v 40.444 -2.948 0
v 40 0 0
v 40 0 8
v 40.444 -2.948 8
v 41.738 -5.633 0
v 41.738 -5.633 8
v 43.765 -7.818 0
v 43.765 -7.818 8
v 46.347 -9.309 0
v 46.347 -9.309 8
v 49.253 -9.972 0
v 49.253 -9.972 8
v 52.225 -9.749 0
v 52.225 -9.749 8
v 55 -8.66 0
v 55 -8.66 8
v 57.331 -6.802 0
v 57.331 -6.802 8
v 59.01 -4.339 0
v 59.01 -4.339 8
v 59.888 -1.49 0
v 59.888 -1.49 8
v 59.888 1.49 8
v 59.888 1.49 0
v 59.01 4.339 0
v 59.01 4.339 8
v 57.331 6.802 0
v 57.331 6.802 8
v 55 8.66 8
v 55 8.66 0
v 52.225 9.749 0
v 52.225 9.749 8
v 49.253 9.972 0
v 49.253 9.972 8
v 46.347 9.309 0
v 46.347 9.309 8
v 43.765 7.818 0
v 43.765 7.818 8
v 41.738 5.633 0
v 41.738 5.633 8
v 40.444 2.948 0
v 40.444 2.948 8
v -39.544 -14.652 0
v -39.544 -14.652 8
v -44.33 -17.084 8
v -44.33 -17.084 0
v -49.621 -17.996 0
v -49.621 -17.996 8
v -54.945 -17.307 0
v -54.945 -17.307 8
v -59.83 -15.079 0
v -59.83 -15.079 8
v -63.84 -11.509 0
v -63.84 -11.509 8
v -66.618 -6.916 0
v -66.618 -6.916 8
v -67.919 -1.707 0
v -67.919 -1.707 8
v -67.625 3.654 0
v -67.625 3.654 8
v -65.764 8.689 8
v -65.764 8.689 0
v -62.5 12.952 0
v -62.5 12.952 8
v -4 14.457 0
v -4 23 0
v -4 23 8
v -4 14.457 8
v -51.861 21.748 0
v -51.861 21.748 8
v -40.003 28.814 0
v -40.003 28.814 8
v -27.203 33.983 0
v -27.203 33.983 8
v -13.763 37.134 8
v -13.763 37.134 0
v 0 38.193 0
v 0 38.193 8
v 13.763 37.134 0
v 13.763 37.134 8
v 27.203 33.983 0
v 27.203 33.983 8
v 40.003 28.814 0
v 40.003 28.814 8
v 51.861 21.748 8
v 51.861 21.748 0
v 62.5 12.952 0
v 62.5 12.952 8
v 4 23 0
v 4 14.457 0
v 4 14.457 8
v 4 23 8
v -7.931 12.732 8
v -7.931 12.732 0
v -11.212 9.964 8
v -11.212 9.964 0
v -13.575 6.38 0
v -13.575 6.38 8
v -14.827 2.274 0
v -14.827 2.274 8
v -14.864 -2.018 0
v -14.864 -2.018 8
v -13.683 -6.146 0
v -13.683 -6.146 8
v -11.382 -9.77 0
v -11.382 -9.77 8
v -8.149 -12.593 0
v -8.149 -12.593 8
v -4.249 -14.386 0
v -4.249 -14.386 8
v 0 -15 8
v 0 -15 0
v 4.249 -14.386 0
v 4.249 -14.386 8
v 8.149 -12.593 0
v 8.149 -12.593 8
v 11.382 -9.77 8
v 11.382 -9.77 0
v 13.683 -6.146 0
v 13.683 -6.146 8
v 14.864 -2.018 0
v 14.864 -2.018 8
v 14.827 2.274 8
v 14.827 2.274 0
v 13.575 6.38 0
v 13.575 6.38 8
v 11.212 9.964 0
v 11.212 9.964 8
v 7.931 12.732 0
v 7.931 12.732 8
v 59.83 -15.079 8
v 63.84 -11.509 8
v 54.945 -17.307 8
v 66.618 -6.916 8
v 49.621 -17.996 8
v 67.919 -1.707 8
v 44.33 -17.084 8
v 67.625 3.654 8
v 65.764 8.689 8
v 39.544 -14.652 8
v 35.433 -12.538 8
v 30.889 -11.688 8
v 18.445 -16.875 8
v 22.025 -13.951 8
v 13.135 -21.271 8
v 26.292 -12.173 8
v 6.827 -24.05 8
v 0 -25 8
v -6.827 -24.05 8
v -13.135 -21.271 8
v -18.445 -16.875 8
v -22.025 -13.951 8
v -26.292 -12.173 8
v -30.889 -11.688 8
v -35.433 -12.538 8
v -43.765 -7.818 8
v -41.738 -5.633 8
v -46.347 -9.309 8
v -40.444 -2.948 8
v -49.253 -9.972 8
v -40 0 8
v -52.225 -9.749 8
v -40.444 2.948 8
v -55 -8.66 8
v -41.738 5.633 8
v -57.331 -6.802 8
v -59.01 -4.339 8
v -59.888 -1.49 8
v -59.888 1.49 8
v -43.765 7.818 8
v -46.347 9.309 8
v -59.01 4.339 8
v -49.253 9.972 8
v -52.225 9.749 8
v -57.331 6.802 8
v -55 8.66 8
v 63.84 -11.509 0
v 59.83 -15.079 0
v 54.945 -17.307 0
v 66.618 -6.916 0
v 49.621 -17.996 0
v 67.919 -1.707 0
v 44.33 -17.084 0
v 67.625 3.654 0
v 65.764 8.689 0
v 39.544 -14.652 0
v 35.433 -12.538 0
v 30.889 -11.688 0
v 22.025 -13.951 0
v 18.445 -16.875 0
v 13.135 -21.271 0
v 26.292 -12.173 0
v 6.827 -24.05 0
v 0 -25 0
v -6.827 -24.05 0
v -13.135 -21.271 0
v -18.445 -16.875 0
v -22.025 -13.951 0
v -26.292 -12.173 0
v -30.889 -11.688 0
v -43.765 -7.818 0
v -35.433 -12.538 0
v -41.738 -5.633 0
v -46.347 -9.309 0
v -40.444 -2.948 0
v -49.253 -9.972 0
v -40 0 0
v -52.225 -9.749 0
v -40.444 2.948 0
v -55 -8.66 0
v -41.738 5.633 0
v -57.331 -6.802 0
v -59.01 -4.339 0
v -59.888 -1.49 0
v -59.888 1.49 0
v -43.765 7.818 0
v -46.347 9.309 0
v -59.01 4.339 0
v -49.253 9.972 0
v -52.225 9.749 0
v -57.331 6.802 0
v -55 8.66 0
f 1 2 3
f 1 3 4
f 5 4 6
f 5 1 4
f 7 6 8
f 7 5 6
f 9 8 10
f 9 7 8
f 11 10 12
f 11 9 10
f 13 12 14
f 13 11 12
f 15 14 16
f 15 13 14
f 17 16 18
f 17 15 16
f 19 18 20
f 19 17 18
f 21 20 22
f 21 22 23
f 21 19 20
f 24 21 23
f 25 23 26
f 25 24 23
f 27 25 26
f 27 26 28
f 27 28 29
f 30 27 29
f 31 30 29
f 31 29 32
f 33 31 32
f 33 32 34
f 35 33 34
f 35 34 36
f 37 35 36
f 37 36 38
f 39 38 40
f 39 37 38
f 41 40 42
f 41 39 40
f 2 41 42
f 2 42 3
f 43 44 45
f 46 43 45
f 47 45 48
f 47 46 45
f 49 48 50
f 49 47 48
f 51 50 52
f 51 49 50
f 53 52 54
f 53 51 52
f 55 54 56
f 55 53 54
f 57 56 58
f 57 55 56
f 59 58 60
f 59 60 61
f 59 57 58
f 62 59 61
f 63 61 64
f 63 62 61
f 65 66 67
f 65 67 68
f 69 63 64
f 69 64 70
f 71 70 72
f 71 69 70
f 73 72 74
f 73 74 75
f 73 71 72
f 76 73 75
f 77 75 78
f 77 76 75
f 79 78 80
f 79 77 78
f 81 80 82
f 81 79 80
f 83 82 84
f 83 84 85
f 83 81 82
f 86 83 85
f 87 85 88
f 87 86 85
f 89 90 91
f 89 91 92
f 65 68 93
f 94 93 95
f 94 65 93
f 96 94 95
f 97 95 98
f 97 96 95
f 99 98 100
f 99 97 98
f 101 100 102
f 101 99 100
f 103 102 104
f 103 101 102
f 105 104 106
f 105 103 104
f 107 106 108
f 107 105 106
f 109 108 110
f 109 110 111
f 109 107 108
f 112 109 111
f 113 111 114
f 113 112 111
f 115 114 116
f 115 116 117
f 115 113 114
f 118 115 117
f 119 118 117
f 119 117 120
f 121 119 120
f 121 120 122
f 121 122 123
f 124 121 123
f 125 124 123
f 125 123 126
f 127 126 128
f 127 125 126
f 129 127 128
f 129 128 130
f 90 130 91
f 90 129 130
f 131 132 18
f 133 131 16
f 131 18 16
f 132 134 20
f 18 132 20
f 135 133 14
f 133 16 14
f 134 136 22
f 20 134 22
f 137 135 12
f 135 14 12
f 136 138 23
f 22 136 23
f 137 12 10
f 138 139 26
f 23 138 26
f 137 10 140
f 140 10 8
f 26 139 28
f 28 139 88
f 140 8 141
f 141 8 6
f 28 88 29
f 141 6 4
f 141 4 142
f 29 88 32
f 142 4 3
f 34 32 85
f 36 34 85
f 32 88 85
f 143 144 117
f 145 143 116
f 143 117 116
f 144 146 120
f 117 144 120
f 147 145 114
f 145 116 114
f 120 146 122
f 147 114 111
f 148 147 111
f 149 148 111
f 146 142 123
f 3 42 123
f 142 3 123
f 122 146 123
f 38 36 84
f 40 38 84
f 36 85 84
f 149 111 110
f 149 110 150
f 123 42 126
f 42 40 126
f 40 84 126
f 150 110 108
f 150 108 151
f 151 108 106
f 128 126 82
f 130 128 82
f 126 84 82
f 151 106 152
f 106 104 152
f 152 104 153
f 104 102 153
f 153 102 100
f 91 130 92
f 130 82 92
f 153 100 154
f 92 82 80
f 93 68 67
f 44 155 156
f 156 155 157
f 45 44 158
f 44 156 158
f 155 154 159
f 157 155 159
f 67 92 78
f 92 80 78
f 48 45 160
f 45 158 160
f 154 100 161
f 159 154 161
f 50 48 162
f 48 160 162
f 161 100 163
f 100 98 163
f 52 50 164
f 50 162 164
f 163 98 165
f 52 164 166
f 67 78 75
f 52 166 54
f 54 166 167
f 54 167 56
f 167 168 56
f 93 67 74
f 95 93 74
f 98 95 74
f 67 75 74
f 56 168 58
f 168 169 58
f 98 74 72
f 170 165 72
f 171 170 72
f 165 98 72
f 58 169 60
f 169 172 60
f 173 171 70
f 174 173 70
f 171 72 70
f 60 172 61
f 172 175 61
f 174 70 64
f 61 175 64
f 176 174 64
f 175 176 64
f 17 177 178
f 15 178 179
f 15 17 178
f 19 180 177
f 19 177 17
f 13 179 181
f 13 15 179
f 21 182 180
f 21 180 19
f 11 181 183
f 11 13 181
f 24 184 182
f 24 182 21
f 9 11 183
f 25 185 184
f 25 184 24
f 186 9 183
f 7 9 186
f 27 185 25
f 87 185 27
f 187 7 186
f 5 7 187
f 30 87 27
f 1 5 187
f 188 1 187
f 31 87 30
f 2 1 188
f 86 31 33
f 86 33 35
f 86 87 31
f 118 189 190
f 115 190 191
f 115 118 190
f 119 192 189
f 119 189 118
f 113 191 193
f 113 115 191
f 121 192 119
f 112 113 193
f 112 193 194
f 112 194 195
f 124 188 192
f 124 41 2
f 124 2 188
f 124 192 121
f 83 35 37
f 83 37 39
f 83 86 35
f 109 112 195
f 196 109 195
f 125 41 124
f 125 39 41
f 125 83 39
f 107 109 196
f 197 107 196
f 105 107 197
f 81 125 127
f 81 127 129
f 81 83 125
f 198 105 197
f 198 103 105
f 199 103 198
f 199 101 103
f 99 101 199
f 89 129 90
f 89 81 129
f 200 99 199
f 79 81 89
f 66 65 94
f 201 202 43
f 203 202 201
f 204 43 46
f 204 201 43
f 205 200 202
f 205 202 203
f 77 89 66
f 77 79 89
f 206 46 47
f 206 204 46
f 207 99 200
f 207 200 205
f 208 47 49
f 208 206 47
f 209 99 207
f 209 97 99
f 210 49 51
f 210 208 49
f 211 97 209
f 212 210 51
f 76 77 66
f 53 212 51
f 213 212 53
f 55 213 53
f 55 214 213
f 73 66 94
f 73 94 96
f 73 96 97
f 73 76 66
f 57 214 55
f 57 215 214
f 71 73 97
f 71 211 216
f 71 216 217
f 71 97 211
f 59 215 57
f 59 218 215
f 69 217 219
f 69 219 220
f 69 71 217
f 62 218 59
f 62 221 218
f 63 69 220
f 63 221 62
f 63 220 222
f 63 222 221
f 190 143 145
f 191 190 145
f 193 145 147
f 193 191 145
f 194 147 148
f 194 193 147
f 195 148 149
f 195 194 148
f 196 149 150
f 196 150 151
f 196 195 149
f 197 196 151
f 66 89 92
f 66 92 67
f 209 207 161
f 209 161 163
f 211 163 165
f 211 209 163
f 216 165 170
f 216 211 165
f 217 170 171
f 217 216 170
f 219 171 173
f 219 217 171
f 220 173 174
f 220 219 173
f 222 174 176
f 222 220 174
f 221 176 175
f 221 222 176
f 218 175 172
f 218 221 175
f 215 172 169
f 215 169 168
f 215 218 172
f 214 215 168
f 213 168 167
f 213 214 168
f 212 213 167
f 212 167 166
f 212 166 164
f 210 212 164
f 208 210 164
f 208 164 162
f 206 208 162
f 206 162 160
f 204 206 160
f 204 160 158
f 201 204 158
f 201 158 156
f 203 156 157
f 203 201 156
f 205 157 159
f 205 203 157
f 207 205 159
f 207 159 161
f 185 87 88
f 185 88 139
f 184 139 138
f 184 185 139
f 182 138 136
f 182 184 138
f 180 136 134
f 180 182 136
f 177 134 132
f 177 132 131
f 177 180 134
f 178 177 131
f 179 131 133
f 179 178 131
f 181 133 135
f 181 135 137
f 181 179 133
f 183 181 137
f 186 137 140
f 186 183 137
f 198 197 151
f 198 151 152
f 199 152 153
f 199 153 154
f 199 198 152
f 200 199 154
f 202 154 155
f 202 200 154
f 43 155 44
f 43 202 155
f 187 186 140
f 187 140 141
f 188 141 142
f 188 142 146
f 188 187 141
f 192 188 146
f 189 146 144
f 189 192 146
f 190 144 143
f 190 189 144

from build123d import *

# Parameters (mm, degrees)
CROQUIS1_R              = 10
SALIENTE_EXTRUIR2_DEPTH = 8


with BuildPart() as part:
    # Croquis1 → Saliente-Extruir2 (new body)
    with BuildSketch(Plane.XY):
        with BuildLine():
            ThreePointArc((-62.5, 12.951833847), (0, 38.192664612), (62.5, 12.951833847))
            ThreePointArc((62.5, 12.951833847), (63.839595947, -11.509369402), (39.544117647, -14.651775463))
            ThreePointArc((39.544117647, -14.651775463), (28.573082694, -11.763695145), (18.445121951, -16.875351143))
            ThreePointArc((18.445121951, -16.875351143), (0, -25), (-18.445121951, -16.875351143))
            ThreePointArc((-18.445121951, -16.875351143), (-28.573082694, -11.763695145), (-39.544117647, -14.651775463))
            ThreePointArc((-39.544117647, -14.651775463), (-63.839595947, -11.509369402), (-62.5, 12.951833847))
        make_face()
        with Locations((-50, 0)):
            Circle(CROQUIS1_R, mode=Mode.SUBTRACT)
        with Locations(Location((50, 0, 0), (0, 0, 180))):
            Circle(CROQUIS1_R, mode=Mode.SUBTRACT)
        with BuildLine():
            Line((4, 14.456832295), (4, 23))
            Line((4, 23), (-4, 23))
            Line((-4, 23), (-4, 14.456832295))
            ThreePointArc((-4, 14.456832295), (0, -15), (4, 14.456832295))
        make_face(mode=Mode.SUBTRACT)
    extrude(amount=SALIENTE_EXTRUIR2_DEPTH)


solid = part.part
